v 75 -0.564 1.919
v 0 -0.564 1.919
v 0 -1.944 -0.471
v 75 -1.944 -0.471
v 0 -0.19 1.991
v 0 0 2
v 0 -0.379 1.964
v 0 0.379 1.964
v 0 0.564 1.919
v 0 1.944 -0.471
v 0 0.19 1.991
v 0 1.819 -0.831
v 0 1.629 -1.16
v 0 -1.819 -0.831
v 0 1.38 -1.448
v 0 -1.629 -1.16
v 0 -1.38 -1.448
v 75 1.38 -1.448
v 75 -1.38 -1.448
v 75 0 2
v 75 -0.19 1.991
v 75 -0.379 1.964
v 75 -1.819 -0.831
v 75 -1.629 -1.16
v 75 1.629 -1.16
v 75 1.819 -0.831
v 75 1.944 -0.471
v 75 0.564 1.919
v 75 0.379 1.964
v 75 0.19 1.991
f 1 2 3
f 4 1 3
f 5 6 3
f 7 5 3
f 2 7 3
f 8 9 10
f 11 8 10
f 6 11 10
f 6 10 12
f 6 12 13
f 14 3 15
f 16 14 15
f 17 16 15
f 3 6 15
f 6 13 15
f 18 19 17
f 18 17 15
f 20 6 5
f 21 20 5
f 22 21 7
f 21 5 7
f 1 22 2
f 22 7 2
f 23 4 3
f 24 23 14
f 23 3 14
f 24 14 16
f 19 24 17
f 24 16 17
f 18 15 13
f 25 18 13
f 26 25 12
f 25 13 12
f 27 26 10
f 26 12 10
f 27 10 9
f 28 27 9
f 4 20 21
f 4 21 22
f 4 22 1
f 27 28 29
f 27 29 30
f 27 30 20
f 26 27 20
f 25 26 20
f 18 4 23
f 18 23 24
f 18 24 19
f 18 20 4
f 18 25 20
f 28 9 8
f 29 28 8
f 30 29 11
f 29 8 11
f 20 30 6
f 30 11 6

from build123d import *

# Parameters (mm, degrees)
BOSS_EXTRU_1_DEPTH = 75


with BuildPart() as part:
    # Esquisse1 → Boss.-Extru.1 (new body)
    with BuildSketch(Plane(origin=(0, 0, 0), x_dir=(0, 0, -1), z_dir=(1, 0, 0))):
        with BuildLine():
            Line((1.448022121, -1.379576725), (1.448022121, 1.379576723))
            ThreePointArc((1.448022121, 1.379576723), (1, 1.732050807), (0.470737428, 1.943812304))
            Line((0.470737428, 1.943812304), (-1.918759551, 0.56423558))
            ThreePointArc((-1.918759551, 0.56423558), (-1.979585702, 0.285027104), (-2, 0))
            ThreePointArc((-2, 0), (-1.979585702, -0.285027104), (-1.918759551, -0.564235579))
            Line((-1.918759551, -0.564235579), (0.470737429, -1.943812304))
            ThreePointArc((0.470737429, -1.943812304), (1, -1.732050808), (1.448022121, -1.379576725))
        make_face()
    extrude(amount=BOSS_EXTRU_1_DEPTH)


solid = part.part
